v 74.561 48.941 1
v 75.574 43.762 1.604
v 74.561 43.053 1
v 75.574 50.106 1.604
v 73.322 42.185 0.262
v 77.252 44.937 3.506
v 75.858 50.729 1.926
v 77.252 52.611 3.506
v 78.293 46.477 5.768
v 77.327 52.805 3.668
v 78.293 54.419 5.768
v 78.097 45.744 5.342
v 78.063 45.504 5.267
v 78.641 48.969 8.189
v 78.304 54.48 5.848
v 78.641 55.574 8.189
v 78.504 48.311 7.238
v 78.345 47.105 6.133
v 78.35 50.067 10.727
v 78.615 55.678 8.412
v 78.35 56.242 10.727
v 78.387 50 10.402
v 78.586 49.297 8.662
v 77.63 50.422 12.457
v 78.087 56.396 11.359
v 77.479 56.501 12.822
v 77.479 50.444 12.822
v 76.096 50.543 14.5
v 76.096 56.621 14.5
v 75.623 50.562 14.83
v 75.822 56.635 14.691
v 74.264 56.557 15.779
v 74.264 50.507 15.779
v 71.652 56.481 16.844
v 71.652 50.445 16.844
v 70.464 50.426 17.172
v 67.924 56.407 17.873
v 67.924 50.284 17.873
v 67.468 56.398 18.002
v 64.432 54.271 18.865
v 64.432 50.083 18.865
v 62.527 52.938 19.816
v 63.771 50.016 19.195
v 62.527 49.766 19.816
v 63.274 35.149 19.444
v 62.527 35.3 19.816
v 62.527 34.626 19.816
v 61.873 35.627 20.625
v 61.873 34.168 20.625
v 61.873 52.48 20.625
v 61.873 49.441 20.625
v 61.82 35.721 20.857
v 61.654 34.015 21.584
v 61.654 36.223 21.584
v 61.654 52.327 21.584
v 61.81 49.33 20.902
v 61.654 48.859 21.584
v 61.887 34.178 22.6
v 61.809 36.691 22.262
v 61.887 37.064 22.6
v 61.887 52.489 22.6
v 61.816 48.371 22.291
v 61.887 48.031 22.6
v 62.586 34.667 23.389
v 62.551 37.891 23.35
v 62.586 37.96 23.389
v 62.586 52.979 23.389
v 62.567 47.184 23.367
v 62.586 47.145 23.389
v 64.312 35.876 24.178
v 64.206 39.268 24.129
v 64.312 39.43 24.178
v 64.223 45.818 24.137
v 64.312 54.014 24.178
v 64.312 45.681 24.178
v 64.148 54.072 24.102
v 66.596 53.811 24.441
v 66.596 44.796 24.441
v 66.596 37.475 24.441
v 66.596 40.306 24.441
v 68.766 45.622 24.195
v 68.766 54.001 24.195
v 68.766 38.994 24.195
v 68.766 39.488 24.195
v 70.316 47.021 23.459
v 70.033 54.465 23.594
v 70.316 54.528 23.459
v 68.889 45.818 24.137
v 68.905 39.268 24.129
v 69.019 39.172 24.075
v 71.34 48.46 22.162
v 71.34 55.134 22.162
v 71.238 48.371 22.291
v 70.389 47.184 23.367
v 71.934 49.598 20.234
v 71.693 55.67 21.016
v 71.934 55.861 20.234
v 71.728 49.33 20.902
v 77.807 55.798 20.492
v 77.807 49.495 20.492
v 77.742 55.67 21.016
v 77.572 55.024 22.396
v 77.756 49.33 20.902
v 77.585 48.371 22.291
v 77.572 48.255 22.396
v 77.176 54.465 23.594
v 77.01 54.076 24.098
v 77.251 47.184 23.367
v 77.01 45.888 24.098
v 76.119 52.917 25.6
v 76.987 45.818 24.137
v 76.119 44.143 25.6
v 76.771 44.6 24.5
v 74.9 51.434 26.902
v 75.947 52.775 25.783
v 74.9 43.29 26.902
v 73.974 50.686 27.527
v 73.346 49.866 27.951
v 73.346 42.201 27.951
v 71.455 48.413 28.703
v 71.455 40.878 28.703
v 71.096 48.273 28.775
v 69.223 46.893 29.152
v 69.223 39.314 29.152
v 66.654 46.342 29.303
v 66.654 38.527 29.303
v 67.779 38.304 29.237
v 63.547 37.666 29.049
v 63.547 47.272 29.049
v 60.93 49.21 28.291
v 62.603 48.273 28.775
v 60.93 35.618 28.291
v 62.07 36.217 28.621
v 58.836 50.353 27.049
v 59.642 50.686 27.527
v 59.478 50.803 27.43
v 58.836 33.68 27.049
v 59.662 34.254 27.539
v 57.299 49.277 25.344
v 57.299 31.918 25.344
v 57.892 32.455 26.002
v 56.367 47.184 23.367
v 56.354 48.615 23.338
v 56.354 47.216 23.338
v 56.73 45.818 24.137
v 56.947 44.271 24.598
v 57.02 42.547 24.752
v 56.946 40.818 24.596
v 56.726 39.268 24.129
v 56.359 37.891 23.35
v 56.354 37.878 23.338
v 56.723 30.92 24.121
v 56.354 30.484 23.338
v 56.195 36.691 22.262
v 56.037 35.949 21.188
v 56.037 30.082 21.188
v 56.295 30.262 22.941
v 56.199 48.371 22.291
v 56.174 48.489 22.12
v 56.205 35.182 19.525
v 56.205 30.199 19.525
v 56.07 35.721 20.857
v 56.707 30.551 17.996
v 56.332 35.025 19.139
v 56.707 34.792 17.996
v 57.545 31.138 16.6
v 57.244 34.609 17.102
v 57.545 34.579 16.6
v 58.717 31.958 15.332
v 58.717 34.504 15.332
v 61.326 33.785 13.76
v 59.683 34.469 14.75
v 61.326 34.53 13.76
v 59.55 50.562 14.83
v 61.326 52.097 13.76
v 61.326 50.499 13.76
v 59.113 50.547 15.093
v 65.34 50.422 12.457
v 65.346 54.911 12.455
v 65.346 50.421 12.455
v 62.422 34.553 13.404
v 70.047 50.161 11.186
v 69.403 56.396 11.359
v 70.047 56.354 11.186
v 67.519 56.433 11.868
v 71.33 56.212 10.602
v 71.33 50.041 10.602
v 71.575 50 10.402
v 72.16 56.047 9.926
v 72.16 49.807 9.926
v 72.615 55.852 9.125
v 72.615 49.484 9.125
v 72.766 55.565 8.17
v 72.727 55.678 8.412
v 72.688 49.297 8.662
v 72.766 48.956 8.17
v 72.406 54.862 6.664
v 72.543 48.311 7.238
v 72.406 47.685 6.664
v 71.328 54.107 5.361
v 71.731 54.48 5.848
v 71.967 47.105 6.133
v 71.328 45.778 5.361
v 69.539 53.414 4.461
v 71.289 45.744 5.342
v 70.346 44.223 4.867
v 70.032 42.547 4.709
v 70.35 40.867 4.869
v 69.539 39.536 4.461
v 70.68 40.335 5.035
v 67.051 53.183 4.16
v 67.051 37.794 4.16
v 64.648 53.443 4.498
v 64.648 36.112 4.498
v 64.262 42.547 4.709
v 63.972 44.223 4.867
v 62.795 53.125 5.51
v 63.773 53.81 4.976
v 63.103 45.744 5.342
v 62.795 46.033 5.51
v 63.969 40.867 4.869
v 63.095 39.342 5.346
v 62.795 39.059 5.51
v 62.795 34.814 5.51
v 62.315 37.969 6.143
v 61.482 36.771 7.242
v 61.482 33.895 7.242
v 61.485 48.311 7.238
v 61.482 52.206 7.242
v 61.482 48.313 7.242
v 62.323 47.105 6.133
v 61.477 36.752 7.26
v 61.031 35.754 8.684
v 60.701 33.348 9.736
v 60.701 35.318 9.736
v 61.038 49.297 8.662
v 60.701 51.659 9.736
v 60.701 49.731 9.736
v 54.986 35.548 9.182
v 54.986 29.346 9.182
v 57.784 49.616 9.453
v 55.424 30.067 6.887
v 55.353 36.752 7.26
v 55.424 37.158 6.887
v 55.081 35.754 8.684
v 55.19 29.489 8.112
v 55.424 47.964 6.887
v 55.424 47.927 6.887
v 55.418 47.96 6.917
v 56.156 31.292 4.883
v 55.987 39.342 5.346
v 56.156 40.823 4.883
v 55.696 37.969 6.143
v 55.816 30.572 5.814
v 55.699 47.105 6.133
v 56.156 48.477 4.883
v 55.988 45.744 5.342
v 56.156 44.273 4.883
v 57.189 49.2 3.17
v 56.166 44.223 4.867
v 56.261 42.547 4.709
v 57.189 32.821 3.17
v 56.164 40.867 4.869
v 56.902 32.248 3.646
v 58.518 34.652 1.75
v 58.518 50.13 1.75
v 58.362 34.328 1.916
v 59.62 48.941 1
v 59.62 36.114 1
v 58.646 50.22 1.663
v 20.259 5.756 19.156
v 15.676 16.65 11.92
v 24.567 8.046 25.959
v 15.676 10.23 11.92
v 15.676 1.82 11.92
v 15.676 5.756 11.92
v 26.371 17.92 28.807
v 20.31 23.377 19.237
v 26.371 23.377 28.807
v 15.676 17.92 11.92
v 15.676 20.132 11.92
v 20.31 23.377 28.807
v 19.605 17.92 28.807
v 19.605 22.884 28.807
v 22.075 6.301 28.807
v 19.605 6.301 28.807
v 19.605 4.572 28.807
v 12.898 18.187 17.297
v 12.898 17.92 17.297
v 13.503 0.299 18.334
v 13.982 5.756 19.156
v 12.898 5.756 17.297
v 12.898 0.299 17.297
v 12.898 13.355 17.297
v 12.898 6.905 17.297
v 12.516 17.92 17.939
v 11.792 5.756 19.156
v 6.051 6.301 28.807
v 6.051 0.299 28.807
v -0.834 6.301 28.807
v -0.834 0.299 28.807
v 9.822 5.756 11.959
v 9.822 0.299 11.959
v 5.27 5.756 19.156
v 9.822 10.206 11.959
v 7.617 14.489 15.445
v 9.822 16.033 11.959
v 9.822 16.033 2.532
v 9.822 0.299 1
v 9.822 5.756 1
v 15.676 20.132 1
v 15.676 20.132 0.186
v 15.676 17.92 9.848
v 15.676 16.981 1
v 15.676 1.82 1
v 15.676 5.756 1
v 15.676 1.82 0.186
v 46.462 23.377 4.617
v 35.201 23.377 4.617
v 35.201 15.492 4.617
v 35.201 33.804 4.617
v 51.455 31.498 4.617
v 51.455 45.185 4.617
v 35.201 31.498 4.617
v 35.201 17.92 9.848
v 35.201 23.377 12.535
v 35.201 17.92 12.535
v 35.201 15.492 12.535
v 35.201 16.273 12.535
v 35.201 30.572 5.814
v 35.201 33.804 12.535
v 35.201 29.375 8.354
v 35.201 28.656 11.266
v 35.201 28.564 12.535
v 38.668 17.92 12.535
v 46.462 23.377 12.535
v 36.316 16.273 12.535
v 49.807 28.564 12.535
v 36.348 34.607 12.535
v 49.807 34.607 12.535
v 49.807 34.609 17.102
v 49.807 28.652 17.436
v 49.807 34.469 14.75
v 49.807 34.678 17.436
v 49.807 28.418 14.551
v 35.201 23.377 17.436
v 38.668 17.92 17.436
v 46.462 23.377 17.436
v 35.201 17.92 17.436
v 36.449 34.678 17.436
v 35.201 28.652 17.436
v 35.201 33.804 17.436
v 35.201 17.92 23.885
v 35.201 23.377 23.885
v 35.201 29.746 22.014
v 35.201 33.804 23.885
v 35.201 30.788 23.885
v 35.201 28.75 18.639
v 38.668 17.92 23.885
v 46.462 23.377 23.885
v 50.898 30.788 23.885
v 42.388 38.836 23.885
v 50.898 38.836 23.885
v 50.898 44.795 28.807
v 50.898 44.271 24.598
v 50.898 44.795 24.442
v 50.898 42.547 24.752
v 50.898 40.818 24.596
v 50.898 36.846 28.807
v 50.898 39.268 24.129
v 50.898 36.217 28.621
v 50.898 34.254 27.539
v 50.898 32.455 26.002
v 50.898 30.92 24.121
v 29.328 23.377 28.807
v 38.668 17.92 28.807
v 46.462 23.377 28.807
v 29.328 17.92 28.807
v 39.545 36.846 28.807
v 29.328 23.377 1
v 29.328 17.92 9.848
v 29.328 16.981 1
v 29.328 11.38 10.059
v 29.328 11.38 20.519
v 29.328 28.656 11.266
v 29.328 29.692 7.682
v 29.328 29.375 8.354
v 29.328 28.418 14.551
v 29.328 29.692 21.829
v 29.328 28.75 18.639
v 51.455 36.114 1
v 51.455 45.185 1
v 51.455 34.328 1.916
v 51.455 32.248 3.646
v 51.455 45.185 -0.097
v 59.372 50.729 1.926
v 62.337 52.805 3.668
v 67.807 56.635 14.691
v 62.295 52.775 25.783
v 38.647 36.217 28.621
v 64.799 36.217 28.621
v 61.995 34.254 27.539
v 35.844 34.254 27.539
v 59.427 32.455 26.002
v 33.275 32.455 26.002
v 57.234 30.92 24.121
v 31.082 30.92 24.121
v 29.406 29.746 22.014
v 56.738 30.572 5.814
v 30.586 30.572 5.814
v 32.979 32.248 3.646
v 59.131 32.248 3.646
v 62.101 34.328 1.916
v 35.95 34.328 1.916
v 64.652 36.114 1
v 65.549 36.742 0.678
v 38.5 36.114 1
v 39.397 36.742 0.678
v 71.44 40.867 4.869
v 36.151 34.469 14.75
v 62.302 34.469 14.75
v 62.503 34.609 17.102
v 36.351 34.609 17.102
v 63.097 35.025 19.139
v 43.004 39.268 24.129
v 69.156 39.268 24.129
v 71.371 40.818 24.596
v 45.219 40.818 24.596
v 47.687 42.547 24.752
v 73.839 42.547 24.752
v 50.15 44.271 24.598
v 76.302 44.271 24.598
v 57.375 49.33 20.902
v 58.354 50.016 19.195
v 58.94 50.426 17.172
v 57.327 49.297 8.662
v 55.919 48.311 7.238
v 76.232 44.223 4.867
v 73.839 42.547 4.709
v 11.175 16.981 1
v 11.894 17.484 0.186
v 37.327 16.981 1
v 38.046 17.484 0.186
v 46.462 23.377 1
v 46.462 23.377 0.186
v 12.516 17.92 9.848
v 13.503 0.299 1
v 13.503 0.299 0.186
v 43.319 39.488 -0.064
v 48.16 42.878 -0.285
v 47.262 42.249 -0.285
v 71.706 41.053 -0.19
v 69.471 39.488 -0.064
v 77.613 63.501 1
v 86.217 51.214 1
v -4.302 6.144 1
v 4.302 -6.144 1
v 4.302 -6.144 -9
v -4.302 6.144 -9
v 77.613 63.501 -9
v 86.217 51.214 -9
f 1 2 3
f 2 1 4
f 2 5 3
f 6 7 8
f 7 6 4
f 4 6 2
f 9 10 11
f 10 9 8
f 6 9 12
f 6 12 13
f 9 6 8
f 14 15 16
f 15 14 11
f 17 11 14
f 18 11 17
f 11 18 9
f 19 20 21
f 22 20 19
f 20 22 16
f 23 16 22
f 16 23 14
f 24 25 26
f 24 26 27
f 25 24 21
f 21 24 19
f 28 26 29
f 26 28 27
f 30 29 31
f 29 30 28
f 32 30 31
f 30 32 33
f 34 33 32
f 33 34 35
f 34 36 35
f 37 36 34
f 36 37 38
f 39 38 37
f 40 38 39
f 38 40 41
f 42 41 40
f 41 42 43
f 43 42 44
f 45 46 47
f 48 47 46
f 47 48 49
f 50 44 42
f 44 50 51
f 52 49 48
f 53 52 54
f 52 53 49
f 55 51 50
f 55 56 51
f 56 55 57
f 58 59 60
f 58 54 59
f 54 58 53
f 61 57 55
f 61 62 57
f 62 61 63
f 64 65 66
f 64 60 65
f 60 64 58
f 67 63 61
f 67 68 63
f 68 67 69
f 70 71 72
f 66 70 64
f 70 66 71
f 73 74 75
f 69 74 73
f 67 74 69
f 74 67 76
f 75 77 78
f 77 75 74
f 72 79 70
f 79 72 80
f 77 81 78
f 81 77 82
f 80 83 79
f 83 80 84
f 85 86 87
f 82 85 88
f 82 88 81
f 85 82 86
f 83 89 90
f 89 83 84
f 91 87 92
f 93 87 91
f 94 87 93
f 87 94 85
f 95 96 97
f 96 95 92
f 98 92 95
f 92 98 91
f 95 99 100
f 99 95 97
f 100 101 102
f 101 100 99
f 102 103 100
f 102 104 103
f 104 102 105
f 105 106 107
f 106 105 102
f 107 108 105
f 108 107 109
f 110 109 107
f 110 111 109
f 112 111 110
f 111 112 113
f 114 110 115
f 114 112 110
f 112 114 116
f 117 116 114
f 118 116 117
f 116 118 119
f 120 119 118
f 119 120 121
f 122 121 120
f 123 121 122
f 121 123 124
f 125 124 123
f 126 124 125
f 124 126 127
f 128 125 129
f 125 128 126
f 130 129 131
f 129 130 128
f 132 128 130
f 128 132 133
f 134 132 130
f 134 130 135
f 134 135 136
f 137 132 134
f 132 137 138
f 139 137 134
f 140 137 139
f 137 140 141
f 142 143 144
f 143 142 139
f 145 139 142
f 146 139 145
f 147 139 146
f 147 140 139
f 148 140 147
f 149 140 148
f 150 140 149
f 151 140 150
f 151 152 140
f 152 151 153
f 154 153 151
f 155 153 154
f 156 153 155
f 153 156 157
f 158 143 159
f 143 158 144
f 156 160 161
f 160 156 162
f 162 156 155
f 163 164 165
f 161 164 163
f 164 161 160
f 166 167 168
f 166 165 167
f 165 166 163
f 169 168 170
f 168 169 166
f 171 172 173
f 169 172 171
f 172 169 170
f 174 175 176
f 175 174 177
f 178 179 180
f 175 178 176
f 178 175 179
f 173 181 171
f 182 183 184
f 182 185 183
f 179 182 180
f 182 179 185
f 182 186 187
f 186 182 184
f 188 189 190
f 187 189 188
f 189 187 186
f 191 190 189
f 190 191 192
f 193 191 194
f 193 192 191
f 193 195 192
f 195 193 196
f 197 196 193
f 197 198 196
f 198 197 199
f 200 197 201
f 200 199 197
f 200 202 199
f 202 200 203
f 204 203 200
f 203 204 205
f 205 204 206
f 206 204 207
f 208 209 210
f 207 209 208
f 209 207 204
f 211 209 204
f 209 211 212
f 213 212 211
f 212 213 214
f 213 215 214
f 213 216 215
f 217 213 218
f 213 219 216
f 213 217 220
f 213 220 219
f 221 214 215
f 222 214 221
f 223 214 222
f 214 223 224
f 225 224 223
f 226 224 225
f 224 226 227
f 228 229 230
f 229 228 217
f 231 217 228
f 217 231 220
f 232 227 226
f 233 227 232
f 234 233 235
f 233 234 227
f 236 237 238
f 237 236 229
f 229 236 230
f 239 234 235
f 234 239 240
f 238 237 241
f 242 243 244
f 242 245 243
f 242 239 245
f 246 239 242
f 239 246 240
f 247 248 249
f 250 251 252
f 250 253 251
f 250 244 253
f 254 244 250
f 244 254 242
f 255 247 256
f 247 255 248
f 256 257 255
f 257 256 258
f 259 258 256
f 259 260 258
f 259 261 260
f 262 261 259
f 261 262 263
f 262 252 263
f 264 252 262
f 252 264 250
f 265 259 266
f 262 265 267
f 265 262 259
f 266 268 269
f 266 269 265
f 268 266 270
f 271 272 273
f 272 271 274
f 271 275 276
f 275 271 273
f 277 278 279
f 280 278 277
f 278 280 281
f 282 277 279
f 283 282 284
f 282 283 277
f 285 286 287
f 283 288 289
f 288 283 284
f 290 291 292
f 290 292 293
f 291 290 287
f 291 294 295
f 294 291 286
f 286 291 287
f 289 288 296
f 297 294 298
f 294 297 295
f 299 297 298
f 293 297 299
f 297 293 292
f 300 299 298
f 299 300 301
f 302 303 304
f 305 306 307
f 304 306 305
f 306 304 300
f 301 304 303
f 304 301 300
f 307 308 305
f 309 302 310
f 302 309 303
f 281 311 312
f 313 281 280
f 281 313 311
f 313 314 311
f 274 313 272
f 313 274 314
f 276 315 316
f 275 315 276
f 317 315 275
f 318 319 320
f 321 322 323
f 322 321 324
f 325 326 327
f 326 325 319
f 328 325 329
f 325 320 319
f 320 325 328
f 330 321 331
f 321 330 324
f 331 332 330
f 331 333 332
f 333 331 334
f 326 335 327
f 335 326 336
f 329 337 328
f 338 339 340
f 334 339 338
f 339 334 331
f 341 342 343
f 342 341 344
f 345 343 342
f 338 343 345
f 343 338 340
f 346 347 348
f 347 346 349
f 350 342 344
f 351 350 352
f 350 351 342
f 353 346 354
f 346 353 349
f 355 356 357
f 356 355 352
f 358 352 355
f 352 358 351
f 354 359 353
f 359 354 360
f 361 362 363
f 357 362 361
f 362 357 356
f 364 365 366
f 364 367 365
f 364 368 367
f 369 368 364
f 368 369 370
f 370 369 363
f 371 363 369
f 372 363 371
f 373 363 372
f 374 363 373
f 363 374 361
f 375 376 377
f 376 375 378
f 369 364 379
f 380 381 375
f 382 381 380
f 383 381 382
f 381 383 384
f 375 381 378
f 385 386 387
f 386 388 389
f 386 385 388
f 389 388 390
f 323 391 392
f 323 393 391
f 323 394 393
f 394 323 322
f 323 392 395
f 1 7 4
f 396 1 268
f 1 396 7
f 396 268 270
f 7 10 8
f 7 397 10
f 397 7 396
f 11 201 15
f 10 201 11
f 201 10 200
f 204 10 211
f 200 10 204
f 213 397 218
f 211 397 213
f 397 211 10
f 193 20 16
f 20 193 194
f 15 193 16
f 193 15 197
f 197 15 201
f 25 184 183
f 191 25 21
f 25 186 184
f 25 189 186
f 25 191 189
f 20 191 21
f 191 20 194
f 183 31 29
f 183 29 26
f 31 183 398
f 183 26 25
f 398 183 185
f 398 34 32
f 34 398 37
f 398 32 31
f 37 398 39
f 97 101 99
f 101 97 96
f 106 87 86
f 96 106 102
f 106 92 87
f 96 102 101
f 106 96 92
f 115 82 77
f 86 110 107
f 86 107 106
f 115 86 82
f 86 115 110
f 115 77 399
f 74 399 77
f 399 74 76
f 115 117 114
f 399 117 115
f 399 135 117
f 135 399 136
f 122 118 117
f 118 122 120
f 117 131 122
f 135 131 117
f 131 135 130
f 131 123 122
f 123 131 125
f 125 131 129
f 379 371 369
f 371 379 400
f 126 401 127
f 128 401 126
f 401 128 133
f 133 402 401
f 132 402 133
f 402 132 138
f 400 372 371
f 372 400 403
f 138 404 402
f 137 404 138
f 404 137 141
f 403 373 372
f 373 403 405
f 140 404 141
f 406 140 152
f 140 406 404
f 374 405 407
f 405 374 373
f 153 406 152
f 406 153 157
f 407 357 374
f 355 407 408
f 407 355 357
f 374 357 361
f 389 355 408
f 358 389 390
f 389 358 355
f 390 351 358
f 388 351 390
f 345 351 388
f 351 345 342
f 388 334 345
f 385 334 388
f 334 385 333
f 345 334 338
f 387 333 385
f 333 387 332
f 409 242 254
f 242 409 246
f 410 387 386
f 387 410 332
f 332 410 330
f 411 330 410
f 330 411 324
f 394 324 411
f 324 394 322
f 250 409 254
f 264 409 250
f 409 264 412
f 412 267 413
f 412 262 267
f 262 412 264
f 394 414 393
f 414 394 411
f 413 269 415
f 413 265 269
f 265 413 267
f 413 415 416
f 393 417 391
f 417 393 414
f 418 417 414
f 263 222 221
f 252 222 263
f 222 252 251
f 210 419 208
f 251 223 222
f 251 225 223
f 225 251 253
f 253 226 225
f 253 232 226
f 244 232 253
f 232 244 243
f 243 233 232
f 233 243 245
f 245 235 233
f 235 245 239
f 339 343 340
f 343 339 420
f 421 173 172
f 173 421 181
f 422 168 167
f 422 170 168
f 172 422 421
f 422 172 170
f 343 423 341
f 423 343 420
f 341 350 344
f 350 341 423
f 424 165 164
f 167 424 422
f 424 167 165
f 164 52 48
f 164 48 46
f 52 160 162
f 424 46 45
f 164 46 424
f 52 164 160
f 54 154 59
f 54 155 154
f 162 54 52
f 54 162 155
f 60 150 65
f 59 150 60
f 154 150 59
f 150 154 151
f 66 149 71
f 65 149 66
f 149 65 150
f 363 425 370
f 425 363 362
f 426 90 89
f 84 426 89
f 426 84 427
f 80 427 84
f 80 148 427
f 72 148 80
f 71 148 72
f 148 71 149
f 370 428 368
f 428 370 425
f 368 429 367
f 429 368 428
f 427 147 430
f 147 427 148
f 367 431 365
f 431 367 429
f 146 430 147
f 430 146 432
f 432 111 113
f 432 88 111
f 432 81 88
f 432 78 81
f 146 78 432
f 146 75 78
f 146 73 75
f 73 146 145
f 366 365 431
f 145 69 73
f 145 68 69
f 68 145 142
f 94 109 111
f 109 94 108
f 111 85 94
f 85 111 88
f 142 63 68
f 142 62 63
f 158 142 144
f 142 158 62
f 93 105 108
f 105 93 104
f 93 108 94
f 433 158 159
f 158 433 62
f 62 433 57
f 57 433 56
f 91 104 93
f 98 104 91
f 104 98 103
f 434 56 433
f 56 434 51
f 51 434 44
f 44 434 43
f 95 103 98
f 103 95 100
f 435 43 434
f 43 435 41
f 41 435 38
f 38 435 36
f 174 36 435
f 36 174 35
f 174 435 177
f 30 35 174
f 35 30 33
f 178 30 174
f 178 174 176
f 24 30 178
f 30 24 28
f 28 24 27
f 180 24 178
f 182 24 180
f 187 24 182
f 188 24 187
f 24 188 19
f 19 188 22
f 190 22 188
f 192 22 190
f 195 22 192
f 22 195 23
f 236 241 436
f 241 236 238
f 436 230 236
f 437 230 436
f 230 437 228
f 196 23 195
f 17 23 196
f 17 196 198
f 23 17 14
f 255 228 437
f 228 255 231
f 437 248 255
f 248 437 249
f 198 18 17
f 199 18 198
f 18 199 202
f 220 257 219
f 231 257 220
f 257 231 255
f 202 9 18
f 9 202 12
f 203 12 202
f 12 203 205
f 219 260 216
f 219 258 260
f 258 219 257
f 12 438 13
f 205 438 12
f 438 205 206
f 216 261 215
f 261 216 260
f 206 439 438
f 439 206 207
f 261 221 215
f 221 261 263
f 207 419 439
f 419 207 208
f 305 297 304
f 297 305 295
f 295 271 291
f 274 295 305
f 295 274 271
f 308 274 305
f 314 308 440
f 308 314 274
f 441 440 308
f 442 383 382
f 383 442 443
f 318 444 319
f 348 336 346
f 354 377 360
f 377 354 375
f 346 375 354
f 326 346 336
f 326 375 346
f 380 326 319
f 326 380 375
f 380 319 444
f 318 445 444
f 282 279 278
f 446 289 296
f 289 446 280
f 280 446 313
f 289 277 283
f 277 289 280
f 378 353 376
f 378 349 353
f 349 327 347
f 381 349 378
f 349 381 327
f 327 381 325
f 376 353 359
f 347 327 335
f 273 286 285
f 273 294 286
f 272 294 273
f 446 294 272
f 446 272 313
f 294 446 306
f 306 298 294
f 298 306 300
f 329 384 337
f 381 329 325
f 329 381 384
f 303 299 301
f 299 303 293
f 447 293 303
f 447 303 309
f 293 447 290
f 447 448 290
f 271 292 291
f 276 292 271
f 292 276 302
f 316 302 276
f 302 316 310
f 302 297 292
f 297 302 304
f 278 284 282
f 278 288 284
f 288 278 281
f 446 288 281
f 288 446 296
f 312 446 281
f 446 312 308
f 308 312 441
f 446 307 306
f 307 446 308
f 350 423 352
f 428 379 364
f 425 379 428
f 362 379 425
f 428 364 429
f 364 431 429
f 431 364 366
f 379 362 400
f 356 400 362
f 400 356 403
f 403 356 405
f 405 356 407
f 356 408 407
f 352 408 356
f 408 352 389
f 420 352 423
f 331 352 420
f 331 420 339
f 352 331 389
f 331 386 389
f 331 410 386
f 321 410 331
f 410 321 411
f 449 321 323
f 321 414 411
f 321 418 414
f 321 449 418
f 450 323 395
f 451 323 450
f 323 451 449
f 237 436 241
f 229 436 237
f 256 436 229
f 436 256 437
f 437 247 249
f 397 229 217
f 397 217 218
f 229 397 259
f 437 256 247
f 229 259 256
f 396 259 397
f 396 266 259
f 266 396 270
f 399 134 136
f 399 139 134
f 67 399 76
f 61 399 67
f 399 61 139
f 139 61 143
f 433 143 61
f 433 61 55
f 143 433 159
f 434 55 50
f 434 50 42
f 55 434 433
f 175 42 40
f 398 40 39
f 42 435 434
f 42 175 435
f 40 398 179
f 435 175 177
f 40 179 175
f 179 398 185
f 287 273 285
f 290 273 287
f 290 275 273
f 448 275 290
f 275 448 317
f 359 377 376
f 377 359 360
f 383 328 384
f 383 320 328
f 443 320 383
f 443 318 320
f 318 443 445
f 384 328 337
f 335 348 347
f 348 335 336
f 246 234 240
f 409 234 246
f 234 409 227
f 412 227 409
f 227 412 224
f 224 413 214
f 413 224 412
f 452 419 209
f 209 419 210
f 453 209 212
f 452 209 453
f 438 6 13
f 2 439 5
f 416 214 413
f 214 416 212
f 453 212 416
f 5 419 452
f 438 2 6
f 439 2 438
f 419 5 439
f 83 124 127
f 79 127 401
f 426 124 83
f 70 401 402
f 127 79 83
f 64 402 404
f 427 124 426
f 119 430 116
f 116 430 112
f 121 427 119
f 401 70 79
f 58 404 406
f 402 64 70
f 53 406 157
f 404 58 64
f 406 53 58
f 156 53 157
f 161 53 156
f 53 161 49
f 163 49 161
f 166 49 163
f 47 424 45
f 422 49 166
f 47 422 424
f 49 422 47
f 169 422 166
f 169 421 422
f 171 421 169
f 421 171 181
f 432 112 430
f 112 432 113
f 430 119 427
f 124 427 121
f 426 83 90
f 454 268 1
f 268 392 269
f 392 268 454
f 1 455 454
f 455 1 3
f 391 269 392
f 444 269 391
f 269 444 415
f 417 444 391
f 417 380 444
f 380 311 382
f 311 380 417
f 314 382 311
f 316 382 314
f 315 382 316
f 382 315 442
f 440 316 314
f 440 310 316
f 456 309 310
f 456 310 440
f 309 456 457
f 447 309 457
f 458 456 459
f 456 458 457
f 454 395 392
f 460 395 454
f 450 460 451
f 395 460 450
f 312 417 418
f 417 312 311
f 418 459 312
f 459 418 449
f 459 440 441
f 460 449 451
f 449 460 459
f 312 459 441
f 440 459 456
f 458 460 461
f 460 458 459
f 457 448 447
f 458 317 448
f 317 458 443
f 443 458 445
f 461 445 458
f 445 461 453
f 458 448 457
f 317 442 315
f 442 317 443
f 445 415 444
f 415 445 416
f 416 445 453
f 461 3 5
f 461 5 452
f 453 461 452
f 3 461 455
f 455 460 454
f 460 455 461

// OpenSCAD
ext = 200;//distance of extrusion, this should be bigger than the size of the final shape 


module shape1(){
	sf=2;
	scale([sf,sf,1])
	color([1,0,1])
	translate([-2,281,0])
	import("yes.dxf");

}

module shape2(){
	sf=2;
	scale([sf,sf,1])
	color([0,1,1])
	translate([-32,174,0])
	import("no.dxf");
}


module extrude1(){
	rotate([90,0,0])
	translate([0,0,-ext/2])
	linear_extrude(height = ext) shape1();
}

module extrude2(){
	rotate([90,0,90])
	translate([0,0,-ext/2]) 
	linear_extrude(height = ext) shape2();
}

module diagonal(w=20,a=45){
	rotate([0,0,a])
	cube([ext,w,ext],true);
}

module base(l=50, w=50,h=10, a=45){
	rotate([0,0,a]) translate([0,-w/2,-h+1])cube([l,w,h]);
}

module illusion(){
	width = 15;
	length= 100;
	angle = 35;
	intersection(){
		extrude1();
		extrude2();
		diagonal(w=width, a=angle);
	}
	base(l=length, w=width, a=angle);
}

//base();
//shape1();
//shape2();

//extrude1();
//extrude2();

illusion();
